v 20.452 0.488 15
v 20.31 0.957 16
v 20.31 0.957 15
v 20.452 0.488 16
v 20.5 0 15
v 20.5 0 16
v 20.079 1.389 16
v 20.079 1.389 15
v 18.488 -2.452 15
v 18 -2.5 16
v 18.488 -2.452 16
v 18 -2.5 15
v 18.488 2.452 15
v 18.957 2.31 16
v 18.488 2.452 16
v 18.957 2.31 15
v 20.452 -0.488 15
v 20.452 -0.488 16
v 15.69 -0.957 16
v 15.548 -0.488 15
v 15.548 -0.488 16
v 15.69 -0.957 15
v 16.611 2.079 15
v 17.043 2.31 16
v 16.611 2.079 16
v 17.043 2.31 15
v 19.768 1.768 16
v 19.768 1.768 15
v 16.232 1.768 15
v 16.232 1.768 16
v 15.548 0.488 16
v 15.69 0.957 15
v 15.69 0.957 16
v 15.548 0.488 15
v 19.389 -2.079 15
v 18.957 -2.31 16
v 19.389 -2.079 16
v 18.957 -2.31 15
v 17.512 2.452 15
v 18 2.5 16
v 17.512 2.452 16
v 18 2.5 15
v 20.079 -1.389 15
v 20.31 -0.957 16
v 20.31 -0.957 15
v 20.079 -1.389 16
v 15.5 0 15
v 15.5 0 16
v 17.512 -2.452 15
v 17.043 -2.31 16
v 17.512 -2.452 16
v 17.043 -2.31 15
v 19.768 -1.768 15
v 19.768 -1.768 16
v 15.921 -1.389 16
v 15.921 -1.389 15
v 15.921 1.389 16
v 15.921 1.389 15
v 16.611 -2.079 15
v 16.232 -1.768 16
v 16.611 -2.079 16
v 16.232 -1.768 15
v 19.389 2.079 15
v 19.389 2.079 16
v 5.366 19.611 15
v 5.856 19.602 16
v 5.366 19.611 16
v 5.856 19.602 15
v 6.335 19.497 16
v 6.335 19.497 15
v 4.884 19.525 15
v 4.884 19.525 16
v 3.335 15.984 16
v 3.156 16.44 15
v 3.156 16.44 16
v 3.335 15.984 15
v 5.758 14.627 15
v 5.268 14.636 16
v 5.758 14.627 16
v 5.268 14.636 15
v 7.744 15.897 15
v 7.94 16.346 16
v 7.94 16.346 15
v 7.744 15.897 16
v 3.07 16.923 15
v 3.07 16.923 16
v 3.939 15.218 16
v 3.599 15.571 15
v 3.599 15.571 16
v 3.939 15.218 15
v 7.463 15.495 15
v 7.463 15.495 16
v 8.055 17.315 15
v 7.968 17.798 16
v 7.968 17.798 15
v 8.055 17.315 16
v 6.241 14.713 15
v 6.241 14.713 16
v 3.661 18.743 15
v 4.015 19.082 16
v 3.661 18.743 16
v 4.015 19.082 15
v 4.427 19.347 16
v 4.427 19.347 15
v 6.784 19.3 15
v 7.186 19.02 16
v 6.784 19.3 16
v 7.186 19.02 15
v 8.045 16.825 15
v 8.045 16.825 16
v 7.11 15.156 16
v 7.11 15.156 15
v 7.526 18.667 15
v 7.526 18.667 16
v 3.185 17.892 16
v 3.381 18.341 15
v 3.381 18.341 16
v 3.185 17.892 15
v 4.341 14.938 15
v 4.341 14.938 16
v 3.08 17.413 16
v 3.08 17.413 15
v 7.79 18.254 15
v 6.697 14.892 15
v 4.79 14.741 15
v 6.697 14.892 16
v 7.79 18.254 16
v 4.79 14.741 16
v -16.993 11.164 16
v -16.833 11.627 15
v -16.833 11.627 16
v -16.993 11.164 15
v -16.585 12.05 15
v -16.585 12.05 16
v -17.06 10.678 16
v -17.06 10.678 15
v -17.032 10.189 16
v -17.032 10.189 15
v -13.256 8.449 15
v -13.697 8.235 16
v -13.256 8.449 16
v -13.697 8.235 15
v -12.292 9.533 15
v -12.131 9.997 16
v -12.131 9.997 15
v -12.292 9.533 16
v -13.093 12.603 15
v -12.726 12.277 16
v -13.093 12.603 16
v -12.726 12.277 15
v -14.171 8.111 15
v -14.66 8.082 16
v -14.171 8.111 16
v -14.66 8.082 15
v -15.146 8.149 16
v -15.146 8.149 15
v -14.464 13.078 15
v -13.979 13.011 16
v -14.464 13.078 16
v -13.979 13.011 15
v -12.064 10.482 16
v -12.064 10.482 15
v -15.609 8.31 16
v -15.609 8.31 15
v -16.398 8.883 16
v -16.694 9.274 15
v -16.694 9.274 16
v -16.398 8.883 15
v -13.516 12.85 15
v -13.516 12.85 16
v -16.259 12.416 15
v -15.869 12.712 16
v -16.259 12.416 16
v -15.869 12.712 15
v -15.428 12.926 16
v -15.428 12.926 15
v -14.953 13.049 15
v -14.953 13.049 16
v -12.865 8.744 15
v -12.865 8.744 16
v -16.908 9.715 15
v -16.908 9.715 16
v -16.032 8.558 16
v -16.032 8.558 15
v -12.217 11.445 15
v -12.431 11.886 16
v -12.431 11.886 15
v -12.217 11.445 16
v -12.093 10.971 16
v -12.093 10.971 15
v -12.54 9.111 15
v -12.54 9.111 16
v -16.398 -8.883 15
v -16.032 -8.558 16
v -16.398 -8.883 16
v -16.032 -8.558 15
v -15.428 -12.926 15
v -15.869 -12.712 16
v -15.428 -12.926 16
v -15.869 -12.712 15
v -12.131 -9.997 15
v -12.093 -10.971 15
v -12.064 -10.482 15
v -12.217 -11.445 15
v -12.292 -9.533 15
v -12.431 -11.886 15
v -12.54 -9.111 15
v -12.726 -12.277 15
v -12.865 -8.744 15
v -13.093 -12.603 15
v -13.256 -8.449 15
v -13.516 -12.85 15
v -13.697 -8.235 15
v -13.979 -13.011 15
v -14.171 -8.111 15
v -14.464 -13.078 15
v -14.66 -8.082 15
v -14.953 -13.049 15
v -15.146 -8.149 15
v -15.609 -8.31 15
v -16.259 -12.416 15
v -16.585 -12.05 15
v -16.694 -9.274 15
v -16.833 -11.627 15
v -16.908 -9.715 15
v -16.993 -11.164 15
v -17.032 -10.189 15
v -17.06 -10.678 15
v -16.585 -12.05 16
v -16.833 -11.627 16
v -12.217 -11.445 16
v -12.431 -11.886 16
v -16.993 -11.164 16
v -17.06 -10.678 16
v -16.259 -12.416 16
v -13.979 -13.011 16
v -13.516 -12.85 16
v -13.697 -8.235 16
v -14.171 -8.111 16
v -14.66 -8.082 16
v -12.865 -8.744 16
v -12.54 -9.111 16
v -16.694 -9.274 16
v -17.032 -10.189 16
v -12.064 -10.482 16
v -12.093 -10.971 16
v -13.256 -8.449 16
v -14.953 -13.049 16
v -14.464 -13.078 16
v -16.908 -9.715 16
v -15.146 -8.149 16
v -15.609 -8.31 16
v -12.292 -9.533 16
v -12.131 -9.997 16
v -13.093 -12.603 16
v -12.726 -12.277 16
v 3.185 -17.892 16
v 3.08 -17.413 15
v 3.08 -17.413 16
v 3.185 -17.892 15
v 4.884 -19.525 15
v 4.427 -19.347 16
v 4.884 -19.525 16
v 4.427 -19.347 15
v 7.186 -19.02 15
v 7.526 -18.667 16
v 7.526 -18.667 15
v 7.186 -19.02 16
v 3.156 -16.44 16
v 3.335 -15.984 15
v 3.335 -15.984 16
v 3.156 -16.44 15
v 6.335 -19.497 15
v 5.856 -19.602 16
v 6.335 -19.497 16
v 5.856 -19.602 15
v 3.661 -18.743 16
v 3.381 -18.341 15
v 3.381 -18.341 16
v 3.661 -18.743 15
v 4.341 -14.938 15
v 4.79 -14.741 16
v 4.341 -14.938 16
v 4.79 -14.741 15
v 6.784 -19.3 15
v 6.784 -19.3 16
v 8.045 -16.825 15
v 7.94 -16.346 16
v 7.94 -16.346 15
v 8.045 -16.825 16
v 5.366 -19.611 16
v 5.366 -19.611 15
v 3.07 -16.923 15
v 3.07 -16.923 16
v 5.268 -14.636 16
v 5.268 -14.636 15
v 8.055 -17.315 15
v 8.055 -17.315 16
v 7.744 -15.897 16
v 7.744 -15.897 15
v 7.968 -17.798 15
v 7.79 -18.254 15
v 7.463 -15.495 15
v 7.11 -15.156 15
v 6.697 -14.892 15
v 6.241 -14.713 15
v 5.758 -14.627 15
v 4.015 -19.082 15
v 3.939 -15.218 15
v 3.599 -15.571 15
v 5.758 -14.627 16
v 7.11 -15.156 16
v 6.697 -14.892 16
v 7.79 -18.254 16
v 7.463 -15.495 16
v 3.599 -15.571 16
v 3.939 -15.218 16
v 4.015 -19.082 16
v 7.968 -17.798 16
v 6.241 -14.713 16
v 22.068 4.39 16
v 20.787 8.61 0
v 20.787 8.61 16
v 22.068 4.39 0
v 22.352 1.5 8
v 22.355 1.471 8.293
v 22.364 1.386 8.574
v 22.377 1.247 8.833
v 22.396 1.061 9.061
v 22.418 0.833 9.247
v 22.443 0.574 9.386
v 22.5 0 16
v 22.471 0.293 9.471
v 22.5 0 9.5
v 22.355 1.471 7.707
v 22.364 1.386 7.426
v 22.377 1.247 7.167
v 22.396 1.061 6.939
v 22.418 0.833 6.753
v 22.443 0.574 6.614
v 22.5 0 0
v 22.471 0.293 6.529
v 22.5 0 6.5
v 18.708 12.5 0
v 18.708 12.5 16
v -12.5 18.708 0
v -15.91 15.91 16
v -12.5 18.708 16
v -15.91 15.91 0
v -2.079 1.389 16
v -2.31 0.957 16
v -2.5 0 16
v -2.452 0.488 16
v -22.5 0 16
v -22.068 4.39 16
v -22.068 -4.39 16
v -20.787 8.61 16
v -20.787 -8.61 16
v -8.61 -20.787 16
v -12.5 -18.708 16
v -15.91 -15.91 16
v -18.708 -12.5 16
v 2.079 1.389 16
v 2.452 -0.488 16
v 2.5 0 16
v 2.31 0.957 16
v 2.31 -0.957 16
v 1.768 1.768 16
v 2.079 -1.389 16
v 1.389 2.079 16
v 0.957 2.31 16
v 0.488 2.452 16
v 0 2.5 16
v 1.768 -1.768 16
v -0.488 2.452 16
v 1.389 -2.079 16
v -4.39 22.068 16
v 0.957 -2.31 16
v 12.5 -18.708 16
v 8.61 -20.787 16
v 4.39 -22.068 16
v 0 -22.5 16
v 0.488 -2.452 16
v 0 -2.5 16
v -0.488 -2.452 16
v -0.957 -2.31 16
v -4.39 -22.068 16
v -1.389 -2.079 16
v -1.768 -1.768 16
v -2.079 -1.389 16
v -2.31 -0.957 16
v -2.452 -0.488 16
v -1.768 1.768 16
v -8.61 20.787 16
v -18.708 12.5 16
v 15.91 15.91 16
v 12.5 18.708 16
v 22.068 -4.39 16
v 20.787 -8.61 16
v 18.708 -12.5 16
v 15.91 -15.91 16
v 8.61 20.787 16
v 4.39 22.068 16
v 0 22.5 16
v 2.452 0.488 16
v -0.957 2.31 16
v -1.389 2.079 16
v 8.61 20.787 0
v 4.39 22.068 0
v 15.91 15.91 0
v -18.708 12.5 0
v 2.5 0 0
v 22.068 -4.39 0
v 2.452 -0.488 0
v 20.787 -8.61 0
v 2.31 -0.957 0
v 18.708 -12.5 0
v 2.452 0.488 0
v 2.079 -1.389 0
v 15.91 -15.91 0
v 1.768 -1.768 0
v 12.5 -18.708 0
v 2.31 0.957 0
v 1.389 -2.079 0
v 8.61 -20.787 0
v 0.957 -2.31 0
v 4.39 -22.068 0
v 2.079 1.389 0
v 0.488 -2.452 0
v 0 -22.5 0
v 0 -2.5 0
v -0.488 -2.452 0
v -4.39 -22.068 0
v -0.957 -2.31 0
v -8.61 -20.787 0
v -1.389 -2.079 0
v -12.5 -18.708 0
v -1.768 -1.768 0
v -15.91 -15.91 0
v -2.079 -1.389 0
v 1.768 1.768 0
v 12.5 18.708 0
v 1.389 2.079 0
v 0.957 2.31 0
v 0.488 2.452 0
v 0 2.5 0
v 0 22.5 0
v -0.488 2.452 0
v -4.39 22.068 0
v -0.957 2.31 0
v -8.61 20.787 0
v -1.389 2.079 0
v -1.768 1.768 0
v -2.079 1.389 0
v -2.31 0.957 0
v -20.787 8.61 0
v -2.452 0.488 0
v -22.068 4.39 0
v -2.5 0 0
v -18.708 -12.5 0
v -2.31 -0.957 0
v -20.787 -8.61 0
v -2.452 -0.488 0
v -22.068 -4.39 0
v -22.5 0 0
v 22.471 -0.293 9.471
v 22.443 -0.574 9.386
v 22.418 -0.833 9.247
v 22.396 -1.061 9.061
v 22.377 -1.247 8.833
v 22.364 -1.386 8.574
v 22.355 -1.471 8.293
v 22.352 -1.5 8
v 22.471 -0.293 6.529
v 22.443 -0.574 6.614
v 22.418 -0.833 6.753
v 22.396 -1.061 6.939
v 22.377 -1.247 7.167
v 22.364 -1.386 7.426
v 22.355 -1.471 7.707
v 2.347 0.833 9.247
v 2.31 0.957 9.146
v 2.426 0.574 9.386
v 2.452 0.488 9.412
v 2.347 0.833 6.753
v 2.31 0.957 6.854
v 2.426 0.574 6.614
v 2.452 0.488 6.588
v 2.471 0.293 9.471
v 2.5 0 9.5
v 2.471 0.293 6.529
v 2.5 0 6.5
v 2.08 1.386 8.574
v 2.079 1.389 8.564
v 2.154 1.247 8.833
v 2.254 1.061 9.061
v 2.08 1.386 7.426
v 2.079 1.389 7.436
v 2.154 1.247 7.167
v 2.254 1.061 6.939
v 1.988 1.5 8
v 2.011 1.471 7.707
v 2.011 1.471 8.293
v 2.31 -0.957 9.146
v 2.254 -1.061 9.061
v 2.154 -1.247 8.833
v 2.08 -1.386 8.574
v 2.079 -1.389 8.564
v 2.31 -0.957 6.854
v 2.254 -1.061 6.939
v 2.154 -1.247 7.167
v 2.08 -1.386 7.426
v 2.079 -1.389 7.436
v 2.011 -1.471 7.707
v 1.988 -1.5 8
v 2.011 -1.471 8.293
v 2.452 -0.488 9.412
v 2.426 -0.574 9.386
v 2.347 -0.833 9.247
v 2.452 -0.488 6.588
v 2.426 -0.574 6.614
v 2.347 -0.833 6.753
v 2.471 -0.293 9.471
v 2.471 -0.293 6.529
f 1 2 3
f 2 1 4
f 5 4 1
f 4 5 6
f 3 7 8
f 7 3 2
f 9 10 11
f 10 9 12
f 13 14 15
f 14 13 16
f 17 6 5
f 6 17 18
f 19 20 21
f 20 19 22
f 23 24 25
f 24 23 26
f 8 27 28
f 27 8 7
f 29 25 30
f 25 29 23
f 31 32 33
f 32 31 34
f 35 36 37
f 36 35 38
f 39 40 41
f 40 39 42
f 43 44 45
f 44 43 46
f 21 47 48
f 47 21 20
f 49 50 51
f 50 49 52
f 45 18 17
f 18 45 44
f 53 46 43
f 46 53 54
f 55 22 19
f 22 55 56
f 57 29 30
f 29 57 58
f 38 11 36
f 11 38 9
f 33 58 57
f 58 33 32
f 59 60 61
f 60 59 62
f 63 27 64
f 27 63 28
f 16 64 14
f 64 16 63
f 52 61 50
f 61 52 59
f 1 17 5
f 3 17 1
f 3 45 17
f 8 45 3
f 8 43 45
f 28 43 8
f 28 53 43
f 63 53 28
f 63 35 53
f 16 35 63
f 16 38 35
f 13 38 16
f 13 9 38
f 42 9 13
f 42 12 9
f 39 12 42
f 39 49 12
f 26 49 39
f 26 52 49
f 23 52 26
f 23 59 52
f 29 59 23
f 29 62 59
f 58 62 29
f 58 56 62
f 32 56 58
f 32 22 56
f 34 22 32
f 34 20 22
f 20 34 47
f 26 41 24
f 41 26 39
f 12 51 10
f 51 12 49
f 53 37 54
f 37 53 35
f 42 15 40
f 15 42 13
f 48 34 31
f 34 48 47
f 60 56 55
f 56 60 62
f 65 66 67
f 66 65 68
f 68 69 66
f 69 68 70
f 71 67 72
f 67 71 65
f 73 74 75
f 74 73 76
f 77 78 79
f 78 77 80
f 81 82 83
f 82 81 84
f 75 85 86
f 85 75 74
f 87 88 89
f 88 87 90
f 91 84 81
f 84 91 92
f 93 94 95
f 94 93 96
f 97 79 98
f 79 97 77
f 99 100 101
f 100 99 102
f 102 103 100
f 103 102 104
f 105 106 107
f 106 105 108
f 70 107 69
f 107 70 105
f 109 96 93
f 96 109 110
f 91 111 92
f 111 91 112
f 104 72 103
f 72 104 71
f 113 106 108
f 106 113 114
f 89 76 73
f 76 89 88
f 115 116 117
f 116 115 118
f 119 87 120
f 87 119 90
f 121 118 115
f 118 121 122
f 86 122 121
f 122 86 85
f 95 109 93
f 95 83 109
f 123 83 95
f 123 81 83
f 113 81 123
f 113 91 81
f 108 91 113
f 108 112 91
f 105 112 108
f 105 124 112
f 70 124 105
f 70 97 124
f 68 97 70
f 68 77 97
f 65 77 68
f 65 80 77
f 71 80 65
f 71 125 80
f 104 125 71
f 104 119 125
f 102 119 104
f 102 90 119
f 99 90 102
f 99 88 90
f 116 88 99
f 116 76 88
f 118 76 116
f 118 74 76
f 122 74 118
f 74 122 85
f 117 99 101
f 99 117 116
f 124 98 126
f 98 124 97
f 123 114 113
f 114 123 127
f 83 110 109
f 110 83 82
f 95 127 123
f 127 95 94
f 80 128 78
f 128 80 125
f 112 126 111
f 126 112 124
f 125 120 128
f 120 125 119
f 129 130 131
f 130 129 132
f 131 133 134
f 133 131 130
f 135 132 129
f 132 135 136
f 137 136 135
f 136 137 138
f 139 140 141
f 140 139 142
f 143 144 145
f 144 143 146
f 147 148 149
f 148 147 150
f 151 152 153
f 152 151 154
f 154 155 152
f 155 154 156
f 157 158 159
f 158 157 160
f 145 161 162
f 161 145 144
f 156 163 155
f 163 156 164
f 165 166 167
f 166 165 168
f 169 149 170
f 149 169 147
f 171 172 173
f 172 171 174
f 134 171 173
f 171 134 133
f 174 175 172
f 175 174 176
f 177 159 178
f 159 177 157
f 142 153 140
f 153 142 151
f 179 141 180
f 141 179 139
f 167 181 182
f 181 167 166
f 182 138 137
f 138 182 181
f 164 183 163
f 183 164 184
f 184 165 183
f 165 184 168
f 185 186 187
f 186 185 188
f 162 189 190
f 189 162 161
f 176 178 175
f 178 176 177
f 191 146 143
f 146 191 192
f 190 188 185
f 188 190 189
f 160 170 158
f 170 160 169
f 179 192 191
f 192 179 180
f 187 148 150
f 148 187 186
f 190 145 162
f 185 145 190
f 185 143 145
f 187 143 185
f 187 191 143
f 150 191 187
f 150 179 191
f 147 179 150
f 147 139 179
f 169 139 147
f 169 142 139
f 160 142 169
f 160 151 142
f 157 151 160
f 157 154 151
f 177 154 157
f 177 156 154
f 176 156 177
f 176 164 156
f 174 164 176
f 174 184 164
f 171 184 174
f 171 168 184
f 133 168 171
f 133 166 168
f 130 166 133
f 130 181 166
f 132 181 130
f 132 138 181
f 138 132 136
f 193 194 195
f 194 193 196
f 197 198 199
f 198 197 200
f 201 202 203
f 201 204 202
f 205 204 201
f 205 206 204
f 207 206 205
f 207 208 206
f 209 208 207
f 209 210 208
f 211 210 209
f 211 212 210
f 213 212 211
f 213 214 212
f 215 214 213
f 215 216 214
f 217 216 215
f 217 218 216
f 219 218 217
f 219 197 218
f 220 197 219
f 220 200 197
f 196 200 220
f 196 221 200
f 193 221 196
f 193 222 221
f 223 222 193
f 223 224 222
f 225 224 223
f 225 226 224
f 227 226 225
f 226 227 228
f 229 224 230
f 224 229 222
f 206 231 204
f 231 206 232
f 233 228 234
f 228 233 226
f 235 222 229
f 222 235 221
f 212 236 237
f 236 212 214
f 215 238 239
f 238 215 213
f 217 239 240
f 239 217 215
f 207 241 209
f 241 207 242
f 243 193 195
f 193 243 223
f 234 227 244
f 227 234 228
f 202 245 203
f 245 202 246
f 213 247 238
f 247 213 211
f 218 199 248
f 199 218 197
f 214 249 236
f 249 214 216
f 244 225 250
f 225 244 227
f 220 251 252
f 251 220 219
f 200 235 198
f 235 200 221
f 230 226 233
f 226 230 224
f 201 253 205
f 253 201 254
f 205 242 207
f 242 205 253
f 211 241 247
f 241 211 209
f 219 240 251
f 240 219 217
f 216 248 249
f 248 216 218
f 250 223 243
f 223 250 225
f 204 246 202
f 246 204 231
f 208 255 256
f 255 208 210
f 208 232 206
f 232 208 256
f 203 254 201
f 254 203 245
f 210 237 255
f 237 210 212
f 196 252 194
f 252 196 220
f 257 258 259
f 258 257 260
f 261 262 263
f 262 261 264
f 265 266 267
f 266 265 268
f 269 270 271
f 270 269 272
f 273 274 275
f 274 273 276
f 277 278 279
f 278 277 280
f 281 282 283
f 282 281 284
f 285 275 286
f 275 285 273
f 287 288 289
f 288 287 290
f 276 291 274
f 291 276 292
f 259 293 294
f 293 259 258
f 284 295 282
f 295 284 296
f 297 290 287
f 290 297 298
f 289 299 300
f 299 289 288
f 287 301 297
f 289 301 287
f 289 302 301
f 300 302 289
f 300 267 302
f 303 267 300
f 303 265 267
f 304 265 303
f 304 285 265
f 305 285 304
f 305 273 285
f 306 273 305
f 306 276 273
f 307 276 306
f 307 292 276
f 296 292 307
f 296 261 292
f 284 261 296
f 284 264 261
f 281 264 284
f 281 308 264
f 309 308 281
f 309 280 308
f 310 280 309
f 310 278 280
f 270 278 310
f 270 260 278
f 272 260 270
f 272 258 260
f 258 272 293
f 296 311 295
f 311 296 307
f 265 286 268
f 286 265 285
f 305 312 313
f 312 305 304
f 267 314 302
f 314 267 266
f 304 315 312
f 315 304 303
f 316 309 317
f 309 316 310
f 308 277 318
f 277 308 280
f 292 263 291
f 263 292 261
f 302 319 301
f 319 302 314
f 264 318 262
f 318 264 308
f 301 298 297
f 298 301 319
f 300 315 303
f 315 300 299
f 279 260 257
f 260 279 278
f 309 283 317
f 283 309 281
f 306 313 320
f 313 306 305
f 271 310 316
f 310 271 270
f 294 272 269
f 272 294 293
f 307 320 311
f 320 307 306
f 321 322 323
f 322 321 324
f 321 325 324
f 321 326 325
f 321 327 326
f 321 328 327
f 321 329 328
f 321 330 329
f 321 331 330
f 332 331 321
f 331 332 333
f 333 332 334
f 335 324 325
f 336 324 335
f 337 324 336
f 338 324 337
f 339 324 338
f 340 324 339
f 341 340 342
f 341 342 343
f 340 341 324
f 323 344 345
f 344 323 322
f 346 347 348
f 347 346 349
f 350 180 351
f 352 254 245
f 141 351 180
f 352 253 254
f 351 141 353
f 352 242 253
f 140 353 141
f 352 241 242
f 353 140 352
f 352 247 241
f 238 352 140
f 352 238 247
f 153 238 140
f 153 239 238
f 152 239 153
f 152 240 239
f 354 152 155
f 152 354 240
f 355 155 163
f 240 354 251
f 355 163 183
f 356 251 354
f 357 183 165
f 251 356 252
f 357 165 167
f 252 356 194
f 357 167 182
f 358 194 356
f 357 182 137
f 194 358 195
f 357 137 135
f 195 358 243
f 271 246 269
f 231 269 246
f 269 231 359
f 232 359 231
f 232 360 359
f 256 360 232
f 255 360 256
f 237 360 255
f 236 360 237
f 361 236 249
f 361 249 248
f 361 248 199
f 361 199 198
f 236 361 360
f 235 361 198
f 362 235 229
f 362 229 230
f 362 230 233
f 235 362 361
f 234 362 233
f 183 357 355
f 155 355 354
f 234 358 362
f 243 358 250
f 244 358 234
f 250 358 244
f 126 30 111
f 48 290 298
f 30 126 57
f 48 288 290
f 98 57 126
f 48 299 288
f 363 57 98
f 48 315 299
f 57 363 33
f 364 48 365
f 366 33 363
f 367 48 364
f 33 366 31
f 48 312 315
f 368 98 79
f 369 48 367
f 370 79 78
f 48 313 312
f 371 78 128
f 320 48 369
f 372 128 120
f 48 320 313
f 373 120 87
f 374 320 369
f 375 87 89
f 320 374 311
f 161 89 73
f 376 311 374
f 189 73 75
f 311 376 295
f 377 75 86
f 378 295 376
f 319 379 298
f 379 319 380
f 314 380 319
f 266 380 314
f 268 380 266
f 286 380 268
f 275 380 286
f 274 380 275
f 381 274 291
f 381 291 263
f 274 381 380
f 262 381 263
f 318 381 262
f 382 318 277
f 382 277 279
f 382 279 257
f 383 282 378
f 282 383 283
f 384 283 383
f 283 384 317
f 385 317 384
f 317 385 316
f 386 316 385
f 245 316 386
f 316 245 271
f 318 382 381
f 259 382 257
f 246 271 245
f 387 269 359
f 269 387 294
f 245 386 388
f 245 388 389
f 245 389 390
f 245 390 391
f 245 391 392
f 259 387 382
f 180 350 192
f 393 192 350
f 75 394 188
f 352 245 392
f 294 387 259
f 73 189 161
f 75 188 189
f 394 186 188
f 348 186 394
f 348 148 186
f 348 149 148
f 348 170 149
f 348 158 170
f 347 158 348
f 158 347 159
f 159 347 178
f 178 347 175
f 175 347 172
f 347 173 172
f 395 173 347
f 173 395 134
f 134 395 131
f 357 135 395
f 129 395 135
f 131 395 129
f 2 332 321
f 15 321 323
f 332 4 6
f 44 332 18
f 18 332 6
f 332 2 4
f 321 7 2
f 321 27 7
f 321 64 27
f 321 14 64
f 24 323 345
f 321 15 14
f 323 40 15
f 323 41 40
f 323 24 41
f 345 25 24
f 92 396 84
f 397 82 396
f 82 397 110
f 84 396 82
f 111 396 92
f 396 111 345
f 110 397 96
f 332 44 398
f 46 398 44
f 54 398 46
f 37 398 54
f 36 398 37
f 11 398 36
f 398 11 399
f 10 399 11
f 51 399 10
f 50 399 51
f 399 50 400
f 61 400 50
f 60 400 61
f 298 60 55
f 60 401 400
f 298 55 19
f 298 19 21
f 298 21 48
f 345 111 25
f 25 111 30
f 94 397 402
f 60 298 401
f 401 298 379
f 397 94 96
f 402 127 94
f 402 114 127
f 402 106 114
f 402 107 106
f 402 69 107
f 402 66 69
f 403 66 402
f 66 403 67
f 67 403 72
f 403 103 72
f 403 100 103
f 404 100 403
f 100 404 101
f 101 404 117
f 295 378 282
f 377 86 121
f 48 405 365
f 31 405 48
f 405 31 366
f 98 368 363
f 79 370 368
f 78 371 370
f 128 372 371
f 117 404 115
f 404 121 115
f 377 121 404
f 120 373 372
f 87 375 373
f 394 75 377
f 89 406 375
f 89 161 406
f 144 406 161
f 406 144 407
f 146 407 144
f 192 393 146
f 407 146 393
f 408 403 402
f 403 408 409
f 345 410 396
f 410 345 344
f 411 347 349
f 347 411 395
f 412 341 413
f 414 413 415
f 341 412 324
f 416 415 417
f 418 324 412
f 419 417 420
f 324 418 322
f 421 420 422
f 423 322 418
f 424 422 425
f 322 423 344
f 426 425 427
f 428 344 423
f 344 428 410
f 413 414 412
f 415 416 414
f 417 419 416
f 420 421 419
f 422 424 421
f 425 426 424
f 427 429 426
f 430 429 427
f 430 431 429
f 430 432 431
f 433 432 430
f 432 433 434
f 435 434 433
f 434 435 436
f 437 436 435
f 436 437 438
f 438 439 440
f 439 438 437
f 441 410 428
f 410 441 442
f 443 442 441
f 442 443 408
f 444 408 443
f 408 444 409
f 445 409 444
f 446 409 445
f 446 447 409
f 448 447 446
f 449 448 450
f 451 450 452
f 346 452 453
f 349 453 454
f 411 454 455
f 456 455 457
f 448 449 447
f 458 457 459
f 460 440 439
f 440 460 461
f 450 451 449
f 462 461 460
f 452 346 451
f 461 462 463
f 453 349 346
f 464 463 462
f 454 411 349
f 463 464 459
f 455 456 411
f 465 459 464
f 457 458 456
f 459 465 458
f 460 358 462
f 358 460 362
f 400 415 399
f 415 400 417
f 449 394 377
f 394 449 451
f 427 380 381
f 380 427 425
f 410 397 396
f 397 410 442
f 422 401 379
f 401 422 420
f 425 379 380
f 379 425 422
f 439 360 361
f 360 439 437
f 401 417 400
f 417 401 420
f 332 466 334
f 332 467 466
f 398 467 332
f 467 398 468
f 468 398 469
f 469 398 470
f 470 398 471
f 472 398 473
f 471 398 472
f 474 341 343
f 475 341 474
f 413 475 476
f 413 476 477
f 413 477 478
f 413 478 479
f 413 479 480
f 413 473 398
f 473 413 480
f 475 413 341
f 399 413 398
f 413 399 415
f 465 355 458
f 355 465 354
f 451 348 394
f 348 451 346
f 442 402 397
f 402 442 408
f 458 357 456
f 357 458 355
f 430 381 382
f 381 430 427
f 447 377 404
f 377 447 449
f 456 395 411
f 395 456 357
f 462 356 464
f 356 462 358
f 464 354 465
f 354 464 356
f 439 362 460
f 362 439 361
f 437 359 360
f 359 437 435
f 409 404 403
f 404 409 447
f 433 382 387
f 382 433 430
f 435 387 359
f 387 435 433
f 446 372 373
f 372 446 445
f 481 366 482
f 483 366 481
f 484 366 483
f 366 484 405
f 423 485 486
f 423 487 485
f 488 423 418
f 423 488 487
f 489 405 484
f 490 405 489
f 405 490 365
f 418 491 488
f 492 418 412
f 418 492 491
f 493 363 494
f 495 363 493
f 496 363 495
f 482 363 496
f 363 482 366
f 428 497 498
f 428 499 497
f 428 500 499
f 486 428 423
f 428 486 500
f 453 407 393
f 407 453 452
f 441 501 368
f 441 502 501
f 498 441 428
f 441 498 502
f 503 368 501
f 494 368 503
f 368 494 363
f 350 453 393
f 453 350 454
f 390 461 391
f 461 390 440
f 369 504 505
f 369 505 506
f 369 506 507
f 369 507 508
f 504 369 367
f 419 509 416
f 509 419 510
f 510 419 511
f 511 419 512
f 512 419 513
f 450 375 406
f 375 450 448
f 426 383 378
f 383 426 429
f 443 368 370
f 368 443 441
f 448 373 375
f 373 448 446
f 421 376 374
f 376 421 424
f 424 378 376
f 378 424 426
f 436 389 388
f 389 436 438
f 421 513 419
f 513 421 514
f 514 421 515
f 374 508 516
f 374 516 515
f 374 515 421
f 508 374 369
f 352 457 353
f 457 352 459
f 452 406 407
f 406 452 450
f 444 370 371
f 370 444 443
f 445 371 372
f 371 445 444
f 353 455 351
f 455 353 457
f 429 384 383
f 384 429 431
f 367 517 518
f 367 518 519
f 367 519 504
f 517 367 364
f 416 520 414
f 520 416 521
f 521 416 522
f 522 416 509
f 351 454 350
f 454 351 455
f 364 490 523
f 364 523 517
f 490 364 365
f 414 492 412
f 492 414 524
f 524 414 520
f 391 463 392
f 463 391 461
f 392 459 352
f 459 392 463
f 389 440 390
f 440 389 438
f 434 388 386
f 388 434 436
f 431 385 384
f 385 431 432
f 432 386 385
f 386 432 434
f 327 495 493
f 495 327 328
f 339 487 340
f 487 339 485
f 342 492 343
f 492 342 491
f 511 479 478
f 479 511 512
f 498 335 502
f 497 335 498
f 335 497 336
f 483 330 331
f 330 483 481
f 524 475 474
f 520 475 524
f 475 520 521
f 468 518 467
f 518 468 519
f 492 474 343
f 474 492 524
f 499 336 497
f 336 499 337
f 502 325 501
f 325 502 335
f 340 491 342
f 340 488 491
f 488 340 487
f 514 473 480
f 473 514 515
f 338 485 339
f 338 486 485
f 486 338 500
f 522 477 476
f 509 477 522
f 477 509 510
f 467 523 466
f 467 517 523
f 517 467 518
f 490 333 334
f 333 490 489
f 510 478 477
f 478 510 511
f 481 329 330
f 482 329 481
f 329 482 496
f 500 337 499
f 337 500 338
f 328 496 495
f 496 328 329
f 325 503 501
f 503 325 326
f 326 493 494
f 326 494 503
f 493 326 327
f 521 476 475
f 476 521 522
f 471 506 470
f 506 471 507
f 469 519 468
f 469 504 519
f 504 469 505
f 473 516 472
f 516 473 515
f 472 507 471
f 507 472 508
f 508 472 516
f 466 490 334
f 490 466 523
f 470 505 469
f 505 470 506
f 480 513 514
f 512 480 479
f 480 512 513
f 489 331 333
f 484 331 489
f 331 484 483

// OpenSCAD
$fn = 32;

// ----------------------------------------------------------------------
// Control knob: dimpled knob
// ----------------------------------------------------------------------

// --- parameters (mm) ---
dimp_d = 5;               // finger dimple diameter
n_dimp = 5;               // number of dimples
dimp_r = 18;              // dimple ring radius
knob_d = 45;              // knob body diameter
knob_h = 16;              // knob body height
bore_d = 5;               // shaft bore diameter
set_d = 3;                // set screw bore diameter

dimp_step = 360 / n_dimp;  // dimple angular step

difference() {
  cylinder(h = knob_h, d = knob_d);
  translate([0, 0, -1]) cylinder(h = knob_h + 2, d = bore_d);
  translate([-1, 0, knob_h / 2]) rotate([0, 90, 0])
    cylinder(h = knob_d / 2 + bore_d / 2 + 2, d = set_d);  for (i = [0 : n_dimp - 1])
    rotate([0, 0, i * dimp_step])
      translate([dimp_r, 0, knob_h - 1])
        cylinder(h = 2, d = dimp_d);
}
